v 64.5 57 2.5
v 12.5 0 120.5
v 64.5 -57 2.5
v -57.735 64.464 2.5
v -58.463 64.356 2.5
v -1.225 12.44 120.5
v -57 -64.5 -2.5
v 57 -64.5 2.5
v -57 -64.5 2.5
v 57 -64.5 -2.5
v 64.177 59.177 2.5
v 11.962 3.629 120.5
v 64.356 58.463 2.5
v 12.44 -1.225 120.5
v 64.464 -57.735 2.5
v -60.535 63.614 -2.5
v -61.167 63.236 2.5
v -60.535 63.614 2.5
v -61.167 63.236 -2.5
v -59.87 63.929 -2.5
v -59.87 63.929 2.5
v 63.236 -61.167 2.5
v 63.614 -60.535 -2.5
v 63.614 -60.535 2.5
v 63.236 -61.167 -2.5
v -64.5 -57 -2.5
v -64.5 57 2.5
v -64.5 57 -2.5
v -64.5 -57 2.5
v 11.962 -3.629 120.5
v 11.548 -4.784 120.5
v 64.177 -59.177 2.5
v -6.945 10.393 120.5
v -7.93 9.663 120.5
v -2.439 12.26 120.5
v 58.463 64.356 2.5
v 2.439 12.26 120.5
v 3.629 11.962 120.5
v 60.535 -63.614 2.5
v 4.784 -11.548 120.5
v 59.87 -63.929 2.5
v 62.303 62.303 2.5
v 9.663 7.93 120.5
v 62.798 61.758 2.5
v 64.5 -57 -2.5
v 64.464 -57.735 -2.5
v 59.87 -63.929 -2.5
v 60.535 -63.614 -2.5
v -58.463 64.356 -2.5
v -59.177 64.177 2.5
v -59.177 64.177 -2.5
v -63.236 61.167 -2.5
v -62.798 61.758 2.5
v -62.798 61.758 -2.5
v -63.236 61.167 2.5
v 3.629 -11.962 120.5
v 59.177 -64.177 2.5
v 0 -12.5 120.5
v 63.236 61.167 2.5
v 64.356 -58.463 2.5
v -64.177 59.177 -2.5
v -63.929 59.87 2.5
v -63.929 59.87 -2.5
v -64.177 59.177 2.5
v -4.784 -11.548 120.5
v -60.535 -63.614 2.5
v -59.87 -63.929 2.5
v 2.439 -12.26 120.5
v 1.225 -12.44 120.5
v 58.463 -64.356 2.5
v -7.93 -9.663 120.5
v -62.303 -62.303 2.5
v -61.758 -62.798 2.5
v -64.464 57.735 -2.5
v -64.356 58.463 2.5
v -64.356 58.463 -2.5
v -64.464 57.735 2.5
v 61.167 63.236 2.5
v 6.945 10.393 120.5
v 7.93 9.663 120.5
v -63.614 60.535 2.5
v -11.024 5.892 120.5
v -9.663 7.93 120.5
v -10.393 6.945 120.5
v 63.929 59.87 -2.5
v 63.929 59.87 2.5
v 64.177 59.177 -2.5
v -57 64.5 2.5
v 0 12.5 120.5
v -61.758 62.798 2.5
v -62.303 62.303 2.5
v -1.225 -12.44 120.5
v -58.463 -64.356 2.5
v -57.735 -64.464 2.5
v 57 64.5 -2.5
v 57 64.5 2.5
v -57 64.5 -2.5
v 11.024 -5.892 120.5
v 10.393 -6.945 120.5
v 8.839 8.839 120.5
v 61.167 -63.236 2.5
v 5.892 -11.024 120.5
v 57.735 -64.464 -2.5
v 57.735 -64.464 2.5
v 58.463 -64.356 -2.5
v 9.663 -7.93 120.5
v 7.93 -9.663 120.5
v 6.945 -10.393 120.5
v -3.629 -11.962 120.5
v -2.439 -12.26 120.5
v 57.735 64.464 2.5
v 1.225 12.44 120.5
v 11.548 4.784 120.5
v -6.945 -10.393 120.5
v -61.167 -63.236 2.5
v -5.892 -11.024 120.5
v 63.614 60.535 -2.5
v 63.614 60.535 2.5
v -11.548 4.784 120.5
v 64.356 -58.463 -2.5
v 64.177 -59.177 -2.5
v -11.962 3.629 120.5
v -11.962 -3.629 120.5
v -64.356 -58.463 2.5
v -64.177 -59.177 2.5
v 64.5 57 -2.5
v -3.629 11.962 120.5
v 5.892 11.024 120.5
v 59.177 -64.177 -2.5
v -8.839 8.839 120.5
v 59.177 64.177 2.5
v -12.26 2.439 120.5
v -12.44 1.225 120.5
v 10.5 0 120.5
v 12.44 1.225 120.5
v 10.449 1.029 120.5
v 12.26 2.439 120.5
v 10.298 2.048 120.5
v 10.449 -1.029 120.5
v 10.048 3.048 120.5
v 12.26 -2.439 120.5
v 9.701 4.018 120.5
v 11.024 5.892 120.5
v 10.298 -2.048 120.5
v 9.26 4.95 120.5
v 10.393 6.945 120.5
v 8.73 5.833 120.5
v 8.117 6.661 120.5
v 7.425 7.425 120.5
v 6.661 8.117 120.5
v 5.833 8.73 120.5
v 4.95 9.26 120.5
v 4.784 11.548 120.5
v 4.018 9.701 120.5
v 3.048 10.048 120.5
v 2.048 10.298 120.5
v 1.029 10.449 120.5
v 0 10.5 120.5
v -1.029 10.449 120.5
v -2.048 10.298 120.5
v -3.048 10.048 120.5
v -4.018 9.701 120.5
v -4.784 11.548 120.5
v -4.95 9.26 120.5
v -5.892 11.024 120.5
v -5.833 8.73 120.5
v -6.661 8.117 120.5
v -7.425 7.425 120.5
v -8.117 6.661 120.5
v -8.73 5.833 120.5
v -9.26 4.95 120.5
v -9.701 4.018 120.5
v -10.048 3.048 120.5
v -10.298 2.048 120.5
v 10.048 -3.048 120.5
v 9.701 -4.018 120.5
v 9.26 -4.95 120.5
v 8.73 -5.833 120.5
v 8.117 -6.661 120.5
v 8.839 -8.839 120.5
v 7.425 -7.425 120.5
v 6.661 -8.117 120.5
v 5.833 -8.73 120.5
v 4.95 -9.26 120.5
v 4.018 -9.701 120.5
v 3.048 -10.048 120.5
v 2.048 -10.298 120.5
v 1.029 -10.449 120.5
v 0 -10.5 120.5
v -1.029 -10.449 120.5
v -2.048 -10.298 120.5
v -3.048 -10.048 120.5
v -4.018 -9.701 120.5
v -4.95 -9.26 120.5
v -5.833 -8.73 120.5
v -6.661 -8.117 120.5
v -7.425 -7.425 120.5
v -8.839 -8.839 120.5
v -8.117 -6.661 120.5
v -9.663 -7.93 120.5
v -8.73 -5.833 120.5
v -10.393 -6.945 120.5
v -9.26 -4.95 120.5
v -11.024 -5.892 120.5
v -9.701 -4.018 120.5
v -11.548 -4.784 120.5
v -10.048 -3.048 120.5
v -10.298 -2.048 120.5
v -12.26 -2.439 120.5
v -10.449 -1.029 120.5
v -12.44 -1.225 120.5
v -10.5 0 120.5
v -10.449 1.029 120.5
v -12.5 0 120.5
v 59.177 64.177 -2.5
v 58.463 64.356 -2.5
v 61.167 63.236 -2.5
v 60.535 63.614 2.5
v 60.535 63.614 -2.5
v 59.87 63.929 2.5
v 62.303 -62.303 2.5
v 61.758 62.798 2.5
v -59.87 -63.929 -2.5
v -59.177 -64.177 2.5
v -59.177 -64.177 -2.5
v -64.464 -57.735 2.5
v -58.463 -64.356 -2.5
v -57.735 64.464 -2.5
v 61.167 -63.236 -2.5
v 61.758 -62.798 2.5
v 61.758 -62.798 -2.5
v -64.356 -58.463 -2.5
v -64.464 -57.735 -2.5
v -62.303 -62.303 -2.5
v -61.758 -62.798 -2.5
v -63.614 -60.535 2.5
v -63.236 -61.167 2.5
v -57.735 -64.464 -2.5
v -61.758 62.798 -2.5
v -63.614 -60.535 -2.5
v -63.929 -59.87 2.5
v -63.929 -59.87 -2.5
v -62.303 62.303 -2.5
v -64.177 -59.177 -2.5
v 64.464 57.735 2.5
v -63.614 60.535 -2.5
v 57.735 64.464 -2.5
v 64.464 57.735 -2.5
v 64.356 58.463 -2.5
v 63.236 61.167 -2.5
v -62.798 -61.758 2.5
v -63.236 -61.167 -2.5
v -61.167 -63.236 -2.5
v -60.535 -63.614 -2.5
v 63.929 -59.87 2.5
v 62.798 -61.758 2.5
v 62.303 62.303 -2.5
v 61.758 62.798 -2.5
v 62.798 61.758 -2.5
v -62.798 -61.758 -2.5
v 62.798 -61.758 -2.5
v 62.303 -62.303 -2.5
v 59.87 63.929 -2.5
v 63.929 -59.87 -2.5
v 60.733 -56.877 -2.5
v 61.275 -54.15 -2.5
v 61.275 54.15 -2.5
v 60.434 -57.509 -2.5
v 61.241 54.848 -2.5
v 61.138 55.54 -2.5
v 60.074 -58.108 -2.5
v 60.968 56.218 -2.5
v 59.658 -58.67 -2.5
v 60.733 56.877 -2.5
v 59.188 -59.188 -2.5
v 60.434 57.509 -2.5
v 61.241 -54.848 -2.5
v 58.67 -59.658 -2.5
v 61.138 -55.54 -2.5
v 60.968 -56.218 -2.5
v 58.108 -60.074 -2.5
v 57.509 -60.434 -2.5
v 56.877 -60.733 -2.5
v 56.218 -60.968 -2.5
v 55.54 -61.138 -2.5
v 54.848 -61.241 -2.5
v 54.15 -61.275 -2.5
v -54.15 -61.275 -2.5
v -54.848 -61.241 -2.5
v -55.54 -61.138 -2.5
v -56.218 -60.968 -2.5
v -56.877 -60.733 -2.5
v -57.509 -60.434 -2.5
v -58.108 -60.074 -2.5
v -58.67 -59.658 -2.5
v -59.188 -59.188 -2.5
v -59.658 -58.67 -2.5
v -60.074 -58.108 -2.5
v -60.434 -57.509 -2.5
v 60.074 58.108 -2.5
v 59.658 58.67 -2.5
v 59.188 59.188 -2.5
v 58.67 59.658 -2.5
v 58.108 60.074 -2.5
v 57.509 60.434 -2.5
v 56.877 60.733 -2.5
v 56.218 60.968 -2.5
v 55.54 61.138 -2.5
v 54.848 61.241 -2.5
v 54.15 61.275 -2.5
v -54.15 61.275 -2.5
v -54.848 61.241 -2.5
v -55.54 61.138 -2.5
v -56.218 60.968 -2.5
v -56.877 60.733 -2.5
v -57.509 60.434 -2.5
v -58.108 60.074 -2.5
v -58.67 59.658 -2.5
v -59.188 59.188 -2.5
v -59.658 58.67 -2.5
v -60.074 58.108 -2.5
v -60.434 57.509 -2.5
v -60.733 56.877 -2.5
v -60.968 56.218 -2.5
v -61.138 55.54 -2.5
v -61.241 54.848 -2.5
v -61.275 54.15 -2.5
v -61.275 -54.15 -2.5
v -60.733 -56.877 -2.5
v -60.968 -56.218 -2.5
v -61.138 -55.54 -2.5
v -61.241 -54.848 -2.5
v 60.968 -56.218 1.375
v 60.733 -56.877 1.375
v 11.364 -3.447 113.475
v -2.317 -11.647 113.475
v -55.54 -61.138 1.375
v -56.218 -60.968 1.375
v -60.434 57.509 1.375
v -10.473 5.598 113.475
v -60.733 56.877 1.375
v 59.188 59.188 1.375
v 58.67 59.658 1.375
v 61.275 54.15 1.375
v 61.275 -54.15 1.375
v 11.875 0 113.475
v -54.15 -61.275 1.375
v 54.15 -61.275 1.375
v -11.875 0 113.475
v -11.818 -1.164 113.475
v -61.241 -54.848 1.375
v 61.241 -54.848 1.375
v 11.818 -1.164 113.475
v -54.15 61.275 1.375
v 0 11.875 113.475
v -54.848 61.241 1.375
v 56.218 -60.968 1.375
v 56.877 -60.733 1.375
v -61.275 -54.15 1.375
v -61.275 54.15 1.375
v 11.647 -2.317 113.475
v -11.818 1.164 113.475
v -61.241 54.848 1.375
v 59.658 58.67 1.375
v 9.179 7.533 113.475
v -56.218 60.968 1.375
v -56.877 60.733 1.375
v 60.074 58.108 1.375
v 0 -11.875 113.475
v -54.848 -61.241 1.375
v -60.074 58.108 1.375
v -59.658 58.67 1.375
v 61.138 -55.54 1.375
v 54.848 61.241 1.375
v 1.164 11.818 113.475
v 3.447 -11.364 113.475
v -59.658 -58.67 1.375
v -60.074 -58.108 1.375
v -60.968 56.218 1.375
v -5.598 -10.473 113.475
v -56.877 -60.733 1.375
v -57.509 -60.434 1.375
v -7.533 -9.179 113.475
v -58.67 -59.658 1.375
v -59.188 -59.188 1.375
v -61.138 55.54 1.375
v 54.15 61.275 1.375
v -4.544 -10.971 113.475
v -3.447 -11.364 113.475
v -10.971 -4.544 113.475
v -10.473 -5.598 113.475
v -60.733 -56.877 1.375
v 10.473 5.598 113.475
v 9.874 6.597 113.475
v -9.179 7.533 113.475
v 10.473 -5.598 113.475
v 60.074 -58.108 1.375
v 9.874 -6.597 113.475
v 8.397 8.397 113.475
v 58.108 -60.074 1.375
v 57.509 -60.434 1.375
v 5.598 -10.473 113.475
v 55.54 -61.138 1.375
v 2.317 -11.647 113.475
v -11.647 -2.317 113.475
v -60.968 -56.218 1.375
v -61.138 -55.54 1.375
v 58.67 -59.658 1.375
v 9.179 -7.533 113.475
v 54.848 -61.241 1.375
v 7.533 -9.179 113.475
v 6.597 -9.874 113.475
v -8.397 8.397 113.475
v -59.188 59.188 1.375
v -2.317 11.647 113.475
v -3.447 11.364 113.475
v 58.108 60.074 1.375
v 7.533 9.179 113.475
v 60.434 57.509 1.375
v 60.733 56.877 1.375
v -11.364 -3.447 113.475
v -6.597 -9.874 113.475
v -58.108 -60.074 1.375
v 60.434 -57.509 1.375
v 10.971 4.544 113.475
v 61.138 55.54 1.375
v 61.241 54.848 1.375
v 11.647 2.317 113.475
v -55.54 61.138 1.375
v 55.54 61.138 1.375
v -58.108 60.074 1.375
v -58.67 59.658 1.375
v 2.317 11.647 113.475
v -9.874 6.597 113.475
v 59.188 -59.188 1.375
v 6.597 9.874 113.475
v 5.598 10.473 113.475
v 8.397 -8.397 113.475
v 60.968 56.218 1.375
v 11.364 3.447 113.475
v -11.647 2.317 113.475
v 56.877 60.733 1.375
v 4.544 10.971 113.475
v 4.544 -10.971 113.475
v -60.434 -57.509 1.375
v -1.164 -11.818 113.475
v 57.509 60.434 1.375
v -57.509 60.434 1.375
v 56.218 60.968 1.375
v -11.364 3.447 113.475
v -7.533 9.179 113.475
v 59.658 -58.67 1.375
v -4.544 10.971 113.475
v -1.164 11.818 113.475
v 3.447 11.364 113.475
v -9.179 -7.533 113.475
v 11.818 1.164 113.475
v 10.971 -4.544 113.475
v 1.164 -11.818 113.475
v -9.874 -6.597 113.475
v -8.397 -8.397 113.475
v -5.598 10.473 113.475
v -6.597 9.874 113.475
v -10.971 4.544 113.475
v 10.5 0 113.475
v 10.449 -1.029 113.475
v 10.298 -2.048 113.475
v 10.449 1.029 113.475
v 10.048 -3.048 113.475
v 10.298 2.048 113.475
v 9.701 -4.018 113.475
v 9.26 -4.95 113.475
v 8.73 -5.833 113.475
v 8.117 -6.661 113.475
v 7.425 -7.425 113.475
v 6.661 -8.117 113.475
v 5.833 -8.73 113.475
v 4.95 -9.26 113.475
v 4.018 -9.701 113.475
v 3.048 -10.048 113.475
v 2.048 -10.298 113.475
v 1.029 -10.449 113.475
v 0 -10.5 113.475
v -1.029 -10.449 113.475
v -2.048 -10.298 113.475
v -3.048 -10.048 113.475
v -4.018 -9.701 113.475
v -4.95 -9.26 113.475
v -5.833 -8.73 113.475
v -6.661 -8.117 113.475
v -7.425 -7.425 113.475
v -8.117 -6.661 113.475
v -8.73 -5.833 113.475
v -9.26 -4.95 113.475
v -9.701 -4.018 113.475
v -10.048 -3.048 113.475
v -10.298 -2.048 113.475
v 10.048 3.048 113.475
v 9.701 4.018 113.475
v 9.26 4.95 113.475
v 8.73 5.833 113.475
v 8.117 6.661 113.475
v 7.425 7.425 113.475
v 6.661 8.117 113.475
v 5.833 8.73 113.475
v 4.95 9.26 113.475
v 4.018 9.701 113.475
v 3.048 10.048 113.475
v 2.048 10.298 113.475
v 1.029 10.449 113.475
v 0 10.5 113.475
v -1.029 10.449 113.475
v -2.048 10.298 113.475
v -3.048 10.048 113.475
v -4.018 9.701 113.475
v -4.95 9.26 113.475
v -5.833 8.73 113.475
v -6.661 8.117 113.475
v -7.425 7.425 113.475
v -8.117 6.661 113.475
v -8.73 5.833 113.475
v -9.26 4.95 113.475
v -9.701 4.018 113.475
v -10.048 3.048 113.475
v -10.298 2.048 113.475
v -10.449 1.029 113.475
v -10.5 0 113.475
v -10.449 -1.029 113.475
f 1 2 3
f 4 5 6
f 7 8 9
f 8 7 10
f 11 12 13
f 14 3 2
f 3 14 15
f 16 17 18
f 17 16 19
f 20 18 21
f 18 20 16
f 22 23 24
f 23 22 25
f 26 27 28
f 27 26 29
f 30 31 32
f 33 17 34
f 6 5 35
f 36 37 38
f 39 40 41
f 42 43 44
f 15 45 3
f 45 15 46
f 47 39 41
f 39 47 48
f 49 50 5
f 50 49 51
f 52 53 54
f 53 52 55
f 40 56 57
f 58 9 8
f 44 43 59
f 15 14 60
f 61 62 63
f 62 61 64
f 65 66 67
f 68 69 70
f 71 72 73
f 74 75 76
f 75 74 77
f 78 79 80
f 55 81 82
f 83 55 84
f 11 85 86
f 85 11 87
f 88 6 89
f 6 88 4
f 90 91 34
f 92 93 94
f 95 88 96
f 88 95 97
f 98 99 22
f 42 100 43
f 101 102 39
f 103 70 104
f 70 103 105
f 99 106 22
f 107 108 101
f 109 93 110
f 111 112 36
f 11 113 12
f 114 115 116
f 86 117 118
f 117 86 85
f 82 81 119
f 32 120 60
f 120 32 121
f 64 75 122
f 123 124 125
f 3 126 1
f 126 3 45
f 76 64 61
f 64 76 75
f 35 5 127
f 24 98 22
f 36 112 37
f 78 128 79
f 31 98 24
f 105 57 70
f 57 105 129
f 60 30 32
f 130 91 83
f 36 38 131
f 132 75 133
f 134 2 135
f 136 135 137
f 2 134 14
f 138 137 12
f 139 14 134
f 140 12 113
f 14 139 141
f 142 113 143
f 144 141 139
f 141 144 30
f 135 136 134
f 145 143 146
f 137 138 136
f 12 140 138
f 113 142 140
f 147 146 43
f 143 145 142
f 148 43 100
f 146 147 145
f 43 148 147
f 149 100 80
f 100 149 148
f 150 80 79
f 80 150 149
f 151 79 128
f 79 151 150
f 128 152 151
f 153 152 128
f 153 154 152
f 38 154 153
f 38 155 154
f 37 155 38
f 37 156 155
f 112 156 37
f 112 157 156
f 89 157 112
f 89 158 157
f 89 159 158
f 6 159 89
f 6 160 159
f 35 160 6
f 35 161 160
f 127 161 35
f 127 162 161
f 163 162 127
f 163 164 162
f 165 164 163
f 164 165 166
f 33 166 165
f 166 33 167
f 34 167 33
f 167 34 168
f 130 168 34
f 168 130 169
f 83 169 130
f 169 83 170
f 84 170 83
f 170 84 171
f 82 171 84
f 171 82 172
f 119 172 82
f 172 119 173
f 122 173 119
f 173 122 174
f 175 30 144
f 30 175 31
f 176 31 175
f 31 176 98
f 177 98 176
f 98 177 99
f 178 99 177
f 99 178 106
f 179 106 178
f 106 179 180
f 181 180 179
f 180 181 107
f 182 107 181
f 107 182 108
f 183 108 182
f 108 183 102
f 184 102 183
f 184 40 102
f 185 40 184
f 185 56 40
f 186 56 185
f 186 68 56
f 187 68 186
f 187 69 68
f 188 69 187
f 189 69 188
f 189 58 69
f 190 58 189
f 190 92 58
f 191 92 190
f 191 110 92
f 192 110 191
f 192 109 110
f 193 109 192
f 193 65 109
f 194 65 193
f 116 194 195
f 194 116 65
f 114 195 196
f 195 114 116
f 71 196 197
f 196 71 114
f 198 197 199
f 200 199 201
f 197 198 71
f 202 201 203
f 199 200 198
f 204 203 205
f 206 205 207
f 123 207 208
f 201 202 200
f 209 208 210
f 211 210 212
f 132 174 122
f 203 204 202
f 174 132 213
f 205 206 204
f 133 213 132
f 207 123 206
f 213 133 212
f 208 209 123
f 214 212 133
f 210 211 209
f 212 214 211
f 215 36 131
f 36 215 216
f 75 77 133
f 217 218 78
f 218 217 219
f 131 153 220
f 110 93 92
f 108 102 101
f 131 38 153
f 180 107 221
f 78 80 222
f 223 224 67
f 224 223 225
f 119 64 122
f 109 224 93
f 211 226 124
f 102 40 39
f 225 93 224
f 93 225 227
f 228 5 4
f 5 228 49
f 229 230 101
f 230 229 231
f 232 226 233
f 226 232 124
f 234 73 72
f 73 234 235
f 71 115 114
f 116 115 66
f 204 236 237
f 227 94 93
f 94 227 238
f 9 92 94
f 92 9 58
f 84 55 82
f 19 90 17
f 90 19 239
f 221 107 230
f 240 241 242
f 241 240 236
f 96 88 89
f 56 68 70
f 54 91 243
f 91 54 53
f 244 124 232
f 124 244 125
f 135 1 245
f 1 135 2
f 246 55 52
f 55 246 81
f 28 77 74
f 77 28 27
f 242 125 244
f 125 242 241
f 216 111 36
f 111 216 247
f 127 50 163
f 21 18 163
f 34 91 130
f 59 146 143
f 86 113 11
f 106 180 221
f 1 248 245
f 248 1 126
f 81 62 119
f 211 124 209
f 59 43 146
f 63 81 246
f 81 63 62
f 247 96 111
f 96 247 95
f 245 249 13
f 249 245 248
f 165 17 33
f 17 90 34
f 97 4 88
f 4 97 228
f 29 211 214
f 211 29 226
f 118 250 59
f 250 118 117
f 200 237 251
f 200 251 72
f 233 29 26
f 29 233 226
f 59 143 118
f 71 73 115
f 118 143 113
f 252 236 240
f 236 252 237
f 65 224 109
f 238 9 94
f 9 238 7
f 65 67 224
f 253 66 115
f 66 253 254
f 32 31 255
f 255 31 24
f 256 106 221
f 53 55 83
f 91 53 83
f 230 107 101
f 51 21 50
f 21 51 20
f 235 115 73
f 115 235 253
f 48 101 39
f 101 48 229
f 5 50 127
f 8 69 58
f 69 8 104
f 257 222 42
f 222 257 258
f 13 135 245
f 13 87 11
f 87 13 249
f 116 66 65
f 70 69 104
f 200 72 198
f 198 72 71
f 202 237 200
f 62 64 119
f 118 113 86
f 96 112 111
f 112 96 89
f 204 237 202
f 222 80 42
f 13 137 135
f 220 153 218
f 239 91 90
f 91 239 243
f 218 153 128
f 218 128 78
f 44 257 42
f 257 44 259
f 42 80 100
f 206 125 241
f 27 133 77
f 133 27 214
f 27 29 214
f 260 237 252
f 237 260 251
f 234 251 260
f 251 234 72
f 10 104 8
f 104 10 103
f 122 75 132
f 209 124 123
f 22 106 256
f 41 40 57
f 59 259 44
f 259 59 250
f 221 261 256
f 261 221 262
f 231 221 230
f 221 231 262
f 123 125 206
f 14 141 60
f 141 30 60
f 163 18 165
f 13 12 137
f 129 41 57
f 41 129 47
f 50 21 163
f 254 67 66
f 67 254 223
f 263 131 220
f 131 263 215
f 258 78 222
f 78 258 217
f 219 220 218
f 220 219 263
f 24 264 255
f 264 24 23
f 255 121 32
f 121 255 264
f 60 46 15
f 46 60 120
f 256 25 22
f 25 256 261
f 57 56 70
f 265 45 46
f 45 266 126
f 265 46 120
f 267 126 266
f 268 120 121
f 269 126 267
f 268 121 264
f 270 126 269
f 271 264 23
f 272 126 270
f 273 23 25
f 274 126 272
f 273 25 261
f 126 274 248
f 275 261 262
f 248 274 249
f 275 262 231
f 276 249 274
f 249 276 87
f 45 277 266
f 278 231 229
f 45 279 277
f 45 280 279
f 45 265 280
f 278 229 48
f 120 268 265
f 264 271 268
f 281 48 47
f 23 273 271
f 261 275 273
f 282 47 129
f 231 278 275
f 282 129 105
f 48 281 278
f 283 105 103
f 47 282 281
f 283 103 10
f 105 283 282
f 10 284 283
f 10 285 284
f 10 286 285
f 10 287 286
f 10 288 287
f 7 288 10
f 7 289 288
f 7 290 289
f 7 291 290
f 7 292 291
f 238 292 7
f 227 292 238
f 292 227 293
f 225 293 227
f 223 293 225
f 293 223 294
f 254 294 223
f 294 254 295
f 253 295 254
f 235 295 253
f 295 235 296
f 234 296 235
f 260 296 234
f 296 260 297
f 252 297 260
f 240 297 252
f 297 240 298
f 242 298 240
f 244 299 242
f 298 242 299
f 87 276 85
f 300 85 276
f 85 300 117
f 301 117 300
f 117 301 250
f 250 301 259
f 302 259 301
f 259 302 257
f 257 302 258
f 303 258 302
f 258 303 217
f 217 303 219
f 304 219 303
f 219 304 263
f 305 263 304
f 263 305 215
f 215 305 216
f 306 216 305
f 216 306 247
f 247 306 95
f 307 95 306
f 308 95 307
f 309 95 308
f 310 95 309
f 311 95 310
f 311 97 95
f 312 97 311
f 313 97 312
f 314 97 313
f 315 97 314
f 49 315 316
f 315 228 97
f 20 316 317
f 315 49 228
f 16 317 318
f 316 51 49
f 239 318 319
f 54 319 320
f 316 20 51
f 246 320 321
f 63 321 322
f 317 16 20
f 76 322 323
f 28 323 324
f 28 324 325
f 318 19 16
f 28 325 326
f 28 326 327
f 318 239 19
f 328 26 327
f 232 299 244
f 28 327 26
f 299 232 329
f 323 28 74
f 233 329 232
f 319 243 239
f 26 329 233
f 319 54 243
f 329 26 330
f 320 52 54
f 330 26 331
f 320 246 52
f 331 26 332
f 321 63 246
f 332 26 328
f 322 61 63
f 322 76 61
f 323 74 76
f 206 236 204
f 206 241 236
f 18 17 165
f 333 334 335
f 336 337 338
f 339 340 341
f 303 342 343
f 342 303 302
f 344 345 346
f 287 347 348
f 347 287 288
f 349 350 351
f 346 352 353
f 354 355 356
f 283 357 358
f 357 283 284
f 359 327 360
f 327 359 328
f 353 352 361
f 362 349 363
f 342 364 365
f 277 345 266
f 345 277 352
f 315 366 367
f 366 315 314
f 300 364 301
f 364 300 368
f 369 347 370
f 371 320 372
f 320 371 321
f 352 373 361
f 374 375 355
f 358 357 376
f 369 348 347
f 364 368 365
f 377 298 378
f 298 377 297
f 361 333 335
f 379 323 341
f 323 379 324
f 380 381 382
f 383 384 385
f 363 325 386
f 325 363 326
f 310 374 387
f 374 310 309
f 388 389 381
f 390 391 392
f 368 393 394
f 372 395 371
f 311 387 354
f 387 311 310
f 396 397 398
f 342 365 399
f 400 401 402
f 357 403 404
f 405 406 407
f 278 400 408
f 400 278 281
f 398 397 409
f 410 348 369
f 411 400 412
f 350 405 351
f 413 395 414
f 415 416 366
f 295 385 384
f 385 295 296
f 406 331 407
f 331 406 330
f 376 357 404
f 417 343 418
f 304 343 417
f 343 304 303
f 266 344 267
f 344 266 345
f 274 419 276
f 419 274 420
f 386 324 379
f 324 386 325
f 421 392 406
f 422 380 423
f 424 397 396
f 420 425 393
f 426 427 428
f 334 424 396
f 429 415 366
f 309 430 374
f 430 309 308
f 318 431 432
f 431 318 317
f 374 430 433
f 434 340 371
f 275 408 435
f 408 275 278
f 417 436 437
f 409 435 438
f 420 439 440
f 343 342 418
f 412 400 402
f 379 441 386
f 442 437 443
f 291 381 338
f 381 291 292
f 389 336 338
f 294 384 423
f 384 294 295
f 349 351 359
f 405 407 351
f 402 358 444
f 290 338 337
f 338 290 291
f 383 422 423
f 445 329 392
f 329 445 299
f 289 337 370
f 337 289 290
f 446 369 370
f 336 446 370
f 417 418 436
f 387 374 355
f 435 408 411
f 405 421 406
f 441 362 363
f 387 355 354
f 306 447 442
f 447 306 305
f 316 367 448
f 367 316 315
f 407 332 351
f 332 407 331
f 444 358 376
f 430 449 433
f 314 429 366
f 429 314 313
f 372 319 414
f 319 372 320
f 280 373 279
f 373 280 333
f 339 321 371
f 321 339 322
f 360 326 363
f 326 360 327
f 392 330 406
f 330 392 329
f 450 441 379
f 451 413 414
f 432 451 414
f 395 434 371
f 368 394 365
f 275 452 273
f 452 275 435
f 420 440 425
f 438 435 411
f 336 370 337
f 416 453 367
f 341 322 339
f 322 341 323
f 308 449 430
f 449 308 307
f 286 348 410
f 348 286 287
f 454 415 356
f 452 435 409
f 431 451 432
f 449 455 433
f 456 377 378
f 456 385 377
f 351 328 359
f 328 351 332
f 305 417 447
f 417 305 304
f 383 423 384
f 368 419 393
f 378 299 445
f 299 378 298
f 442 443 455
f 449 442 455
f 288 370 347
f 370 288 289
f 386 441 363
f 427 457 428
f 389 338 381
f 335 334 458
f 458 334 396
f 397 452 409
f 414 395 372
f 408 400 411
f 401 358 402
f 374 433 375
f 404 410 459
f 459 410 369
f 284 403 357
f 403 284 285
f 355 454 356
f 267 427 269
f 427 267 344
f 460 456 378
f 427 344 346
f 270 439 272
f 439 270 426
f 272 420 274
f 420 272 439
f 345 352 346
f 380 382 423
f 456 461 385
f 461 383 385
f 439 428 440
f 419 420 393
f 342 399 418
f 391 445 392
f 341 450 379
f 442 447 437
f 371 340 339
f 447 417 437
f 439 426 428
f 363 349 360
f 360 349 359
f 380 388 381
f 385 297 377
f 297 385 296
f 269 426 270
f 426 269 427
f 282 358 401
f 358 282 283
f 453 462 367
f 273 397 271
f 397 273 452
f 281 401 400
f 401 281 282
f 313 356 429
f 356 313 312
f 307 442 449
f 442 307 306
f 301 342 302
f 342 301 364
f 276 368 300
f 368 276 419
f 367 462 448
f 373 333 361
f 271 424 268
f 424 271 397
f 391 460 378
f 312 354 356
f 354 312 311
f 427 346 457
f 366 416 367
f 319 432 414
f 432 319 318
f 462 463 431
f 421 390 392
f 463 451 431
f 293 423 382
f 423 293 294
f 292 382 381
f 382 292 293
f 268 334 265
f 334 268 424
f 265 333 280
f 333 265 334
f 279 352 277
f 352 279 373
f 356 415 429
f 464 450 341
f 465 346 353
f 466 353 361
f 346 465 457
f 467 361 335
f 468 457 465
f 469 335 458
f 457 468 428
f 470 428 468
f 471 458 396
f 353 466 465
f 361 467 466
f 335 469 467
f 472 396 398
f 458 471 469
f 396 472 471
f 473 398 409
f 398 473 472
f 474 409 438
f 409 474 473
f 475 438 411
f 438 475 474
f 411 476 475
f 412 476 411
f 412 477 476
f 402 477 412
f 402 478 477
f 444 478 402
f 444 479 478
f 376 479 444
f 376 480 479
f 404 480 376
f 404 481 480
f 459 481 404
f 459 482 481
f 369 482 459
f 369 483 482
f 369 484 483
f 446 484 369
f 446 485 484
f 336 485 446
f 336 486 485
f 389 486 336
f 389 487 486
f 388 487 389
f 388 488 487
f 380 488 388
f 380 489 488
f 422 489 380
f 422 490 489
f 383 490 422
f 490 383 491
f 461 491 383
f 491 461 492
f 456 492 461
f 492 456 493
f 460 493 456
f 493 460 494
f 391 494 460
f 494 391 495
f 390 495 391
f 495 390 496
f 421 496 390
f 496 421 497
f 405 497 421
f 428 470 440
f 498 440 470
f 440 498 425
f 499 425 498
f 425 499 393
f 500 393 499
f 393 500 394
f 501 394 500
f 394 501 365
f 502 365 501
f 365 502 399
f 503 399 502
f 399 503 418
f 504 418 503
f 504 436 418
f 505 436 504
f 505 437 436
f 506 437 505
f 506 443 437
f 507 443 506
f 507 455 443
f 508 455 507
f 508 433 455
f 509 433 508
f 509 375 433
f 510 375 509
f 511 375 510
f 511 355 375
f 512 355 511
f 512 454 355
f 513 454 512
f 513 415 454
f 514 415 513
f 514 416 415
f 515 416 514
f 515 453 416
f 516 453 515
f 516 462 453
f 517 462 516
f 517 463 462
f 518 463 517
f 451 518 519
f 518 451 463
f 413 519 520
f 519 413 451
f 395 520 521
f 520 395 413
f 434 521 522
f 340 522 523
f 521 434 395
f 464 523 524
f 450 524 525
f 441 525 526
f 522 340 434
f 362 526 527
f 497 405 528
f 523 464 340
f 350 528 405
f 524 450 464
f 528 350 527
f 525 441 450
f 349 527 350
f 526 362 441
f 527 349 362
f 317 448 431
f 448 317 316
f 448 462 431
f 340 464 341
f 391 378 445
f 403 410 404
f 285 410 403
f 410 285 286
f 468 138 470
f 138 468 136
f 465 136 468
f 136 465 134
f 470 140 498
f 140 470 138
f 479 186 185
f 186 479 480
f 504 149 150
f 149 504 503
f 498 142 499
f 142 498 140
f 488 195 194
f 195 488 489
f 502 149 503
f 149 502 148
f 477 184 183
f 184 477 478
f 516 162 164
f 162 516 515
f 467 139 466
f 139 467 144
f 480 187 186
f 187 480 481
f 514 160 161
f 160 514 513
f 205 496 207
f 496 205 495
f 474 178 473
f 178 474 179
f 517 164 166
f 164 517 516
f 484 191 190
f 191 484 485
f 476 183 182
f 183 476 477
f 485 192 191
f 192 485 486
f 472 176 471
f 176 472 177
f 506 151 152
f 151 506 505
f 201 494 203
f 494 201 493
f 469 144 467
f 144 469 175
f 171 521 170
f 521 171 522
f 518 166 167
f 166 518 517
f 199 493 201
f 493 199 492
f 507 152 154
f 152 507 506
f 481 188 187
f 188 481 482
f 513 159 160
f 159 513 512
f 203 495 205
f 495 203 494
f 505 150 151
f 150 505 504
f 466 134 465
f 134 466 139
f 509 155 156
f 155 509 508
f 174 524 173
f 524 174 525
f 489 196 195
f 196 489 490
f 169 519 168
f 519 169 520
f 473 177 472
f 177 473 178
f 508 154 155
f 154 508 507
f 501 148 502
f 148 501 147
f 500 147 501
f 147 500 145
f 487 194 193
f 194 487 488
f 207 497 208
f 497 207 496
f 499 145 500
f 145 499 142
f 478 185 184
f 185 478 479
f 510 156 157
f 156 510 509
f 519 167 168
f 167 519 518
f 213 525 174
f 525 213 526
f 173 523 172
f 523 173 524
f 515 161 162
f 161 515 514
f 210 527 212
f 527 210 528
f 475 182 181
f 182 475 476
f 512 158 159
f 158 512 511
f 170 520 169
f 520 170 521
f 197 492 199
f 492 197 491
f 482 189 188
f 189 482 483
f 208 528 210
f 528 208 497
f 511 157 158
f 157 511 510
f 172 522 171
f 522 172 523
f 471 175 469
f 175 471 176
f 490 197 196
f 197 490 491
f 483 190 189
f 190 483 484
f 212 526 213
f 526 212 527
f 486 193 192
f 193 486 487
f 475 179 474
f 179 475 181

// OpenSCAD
$fn=64;
round_corner = 15;

nozzle_kit();

module nozzle_kit() {
difference() {
    nozzle();
    translate([0, 0, -1])
    scale([0.95, 0.95, 0.95])
    color("red")
    nozzle();
    translate([0, 0, 120])
    cylinder(d = 25-4, h = 15, center = true);
}
}

module nozzle() {
    hull() {
    frame_square();
    translate([0, 0, 120])
    frame_ring();
}
}
//hull() {
//    frame_square();
//    translate([0, 0, 120])
//    cylinder(d=25, h=1, center = true);
//}

module frame_ring() {
    difference() {
        cylinder(d=25, h=1, center = true);
        color("red")
        cylinder(d=25-6, h=5, center = true);
}
}

module frame_square() {
difference() {
    square_plate();
    translate([0, 0, 1])
    color("red")
    scale([0.95, 0.95, 4])
    square_plate();
}
}

module square_plate() {
hull() {
//    cube([129-round_corner, 129, 1], center = true);
    translate([129/2-round_corner/2, 129/2-round_corner/2, 0])
    color("red")
    cylinder(d = round_corner, h = 5, center = true);
        
    mirror([1, 0, 0])
    translate([129/2-round_corner/2, 129/2-round_corner/2, 0])    
    color("red")
    cylinder(d = round_corner, h = 5, center = true);
        
    mirror([0, 1, 0])
    translate([129/2-round_corner/2, 129/2-round_corner/2, 0])     
    color("red")
    cylinder(d = round_corner, h = 5, center = true);
        
    mirror([1, 1, 0])
    translate([129/2-round_corner/2, 129/2-round_corner/2, 0])    
    color("red")
    cylinder(d = round_corner, h = 5, center = true);
    }
}
